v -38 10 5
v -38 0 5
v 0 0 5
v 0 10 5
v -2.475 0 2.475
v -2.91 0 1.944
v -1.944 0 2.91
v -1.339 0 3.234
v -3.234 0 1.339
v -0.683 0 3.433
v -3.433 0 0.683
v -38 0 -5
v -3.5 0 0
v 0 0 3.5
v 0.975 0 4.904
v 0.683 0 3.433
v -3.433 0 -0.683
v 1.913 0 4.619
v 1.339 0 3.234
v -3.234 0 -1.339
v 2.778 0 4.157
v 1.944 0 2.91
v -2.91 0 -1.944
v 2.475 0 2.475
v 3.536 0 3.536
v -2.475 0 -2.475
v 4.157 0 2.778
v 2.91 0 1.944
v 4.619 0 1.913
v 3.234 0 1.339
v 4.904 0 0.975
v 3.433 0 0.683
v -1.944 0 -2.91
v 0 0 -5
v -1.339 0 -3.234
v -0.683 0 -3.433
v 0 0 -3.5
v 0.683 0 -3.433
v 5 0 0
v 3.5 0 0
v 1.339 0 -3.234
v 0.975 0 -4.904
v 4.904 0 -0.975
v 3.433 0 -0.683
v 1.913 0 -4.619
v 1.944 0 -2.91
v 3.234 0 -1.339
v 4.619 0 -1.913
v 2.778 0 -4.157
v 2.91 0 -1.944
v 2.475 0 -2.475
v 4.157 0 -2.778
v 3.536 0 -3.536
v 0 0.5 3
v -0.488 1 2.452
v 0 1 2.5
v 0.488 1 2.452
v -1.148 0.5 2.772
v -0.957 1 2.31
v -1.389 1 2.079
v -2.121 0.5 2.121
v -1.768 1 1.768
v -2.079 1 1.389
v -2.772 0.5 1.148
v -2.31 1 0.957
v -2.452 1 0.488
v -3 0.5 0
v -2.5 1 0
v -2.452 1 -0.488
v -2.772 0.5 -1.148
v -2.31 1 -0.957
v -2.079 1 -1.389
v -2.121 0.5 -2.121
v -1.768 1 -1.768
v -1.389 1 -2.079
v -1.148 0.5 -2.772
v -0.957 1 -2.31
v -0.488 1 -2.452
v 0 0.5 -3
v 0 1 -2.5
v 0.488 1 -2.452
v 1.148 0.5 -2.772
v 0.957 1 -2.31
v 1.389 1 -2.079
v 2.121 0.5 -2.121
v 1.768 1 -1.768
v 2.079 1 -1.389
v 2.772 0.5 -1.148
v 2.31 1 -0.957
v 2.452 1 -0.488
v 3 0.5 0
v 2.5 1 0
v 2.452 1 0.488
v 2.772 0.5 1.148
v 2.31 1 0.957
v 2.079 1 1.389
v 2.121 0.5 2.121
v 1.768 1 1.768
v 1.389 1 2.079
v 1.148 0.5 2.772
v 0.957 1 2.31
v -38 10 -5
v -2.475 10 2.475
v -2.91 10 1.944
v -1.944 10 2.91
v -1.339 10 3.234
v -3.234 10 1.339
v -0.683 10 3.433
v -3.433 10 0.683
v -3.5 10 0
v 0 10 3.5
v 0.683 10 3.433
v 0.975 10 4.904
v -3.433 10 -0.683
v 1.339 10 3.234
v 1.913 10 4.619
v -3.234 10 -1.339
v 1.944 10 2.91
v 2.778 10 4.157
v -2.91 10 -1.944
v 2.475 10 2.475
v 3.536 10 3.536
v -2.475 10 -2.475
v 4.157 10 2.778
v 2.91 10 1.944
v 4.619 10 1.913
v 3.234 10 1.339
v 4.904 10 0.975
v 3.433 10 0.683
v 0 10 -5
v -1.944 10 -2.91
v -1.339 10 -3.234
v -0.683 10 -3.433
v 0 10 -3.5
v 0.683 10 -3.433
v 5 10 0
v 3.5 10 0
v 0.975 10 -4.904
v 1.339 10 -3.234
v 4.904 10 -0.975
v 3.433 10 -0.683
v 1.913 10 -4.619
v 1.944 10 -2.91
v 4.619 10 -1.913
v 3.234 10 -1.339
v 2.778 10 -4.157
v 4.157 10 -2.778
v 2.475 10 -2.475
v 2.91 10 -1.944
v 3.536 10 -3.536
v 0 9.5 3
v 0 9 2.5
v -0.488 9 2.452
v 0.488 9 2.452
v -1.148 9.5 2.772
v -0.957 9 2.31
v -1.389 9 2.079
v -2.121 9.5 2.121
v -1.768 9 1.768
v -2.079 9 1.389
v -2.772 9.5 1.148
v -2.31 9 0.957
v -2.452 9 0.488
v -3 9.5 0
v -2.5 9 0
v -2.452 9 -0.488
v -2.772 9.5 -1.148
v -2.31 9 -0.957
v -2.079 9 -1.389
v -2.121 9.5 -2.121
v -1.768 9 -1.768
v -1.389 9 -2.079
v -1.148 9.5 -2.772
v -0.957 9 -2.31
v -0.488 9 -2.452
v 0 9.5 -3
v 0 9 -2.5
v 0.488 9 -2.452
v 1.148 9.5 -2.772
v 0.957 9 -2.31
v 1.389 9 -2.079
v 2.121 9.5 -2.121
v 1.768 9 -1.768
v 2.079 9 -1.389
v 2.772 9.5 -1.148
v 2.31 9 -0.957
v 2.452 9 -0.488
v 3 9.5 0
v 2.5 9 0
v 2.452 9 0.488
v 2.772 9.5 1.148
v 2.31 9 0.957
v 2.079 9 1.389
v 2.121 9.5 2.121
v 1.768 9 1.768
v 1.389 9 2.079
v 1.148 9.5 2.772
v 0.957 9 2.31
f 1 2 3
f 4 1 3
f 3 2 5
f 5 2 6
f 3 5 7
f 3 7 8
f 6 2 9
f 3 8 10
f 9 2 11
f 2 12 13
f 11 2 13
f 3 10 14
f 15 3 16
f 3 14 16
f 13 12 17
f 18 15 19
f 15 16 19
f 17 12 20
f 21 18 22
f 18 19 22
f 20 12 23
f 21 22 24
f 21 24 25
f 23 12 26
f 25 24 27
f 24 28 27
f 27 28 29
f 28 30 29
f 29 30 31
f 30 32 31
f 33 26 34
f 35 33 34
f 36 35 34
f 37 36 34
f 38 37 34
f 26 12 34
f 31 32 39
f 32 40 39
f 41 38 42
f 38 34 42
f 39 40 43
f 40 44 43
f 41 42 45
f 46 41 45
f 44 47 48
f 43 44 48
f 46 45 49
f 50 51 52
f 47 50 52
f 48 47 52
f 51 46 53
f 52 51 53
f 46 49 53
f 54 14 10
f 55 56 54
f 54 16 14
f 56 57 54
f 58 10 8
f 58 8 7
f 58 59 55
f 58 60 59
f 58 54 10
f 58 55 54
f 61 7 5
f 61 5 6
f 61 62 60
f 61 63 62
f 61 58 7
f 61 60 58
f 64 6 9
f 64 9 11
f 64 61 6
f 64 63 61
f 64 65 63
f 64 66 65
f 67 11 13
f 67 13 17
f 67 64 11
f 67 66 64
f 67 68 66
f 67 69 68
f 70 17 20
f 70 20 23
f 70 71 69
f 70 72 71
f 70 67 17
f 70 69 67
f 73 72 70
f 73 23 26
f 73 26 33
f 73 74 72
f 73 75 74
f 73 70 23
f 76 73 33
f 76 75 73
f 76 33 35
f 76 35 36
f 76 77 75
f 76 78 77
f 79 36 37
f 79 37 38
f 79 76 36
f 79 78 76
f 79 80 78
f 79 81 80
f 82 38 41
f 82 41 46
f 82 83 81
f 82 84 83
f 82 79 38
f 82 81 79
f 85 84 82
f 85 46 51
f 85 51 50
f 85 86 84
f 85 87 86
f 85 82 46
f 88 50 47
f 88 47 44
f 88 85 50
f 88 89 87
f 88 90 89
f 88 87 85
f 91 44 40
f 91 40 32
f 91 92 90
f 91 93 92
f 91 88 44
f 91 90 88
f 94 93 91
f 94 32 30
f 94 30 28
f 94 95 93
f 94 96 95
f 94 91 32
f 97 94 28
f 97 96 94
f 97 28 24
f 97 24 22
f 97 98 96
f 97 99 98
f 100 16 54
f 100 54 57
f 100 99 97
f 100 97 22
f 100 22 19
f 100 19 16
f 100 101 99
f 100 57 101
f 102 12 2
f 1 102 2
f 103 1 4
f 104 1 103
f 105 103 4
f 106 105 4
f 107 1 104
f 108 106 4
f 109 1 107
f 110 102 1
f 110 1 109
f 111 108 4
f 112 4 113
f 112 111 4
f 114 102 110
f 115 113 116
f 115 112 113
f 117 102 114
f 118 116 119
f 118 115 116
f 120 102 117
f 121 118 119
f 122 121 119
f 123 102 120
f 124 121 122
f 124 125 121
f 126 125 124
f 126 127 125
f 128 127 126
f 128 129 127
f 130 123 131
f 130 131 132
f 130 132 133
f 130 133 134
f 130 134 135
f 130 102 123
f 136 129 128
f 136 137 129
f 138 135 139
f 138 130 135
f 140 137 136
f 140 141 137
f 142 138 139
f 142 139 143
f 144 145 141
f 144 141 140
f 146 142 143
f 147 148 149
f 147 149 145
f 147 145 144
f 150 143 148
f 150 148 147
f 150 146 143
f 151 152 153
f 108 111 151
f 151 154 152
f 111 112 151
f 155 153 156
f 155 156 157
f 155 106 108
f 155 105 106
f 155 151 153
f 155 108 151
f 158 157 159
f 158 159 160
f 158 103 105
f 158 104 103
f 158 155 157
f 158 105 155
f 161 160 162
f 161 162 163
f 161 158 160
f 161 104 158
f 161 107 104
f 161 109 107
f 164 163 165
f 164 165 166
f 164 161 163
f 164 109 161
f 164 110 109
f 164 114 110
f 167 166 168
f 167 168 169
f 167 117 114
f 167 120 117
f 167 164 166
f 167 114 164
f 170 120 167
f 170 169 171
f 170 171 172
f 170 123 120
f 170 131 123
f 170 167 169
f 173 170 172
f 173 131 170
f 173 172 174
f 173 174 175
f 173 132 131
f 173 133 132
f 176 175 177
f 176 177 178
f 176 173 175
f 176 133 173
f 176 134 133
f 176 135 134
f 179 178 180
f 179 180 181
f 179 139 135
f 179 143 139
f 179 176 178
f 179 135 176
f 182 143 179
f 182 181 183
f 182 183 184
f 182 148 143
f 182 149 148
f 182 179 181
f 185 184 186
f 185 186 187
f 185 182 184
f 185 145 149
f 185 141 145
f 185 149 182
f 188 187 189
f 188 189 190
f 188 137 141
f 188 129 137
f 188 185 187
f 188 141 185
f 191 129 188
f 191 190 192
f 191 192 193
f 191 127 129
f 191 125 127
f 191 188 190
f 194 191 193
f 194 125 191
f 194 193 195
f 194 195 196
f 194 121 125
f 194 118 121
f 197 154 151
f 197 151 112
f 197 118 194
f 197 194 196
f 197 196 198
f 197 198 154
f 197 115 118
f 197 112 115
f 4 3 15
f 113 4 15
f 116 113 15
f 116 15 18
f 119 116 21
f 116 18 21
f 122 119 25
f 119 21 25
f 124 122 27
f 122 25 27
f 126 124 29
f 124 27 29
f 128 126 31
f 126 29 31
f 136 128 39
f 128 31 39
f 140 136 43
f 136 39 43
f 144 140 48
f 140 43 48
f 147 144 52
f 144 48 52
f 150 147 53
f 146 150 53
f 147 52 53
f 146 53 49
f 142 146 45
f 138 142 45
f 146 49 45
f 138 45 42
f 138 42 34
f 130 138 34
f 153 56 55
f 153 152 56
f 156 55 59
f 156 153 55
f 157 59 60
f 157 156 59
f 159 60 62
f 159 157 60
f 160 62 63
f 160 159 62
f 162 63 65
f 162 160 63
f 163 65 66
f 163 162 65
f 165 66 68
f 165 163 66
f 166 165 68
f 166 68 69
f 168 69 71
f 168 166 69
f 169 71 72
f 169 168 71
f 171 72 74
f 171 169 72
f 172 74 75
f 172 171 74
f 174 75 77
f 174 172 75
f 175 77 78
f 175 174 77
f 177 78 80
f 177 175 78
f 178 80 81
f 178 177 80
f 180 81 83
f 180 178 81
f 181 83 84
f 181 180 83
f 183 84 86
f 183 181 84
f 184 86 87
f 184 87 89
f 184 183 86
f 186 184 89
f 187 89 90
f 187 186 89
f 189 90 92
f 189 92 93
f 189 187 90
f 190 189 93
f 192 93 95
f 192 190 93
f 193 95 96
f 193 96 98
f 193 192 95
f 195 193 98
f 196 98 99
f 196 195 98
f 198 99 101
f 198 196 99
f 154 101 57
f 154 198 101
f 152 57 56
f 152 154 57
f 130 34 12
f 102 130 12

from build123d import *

# Parameters (mm, degrees)
BOSS_EXTRU_1_DEPTH = 10


with BuildPart() as part:
    # Esquisse1 → Boss.-Extru.1 (new body)
    with BuildSketch(Plane(origin=(0, 0, 0), x_dir=(1, 0, 0), z_dir=(0, 1, 0))):
        with BuildLine():
            Line((0, 5), (-38, 5))
            Line((-38, 5), (-38, -5))
            Line((-38, -5), (0, -5))
            ThreePointArc((0, -5), (5, 0), (0, 5))
        make_face()
    extrude(amount=BOSS_EXTRU_1_DEPTH)

    # Esquisse3 → Trou taraudé M61 (revolve, cut)
    with BuildSketch(Plane(origin=(0, 10, 0), x_dir=(0, 0, 1), z_dir=(1, 0, 0))):
        Polygon((0, 0), (0, 10), (3.5, 10), (2.5, 9), (2.5, 1), (3.5, 0), align=None)
    revolve(axis=Axis((0, 16.35, 0), (0, -1, 0)), mode=Mode.SUBTRACT)


solid = part.part
